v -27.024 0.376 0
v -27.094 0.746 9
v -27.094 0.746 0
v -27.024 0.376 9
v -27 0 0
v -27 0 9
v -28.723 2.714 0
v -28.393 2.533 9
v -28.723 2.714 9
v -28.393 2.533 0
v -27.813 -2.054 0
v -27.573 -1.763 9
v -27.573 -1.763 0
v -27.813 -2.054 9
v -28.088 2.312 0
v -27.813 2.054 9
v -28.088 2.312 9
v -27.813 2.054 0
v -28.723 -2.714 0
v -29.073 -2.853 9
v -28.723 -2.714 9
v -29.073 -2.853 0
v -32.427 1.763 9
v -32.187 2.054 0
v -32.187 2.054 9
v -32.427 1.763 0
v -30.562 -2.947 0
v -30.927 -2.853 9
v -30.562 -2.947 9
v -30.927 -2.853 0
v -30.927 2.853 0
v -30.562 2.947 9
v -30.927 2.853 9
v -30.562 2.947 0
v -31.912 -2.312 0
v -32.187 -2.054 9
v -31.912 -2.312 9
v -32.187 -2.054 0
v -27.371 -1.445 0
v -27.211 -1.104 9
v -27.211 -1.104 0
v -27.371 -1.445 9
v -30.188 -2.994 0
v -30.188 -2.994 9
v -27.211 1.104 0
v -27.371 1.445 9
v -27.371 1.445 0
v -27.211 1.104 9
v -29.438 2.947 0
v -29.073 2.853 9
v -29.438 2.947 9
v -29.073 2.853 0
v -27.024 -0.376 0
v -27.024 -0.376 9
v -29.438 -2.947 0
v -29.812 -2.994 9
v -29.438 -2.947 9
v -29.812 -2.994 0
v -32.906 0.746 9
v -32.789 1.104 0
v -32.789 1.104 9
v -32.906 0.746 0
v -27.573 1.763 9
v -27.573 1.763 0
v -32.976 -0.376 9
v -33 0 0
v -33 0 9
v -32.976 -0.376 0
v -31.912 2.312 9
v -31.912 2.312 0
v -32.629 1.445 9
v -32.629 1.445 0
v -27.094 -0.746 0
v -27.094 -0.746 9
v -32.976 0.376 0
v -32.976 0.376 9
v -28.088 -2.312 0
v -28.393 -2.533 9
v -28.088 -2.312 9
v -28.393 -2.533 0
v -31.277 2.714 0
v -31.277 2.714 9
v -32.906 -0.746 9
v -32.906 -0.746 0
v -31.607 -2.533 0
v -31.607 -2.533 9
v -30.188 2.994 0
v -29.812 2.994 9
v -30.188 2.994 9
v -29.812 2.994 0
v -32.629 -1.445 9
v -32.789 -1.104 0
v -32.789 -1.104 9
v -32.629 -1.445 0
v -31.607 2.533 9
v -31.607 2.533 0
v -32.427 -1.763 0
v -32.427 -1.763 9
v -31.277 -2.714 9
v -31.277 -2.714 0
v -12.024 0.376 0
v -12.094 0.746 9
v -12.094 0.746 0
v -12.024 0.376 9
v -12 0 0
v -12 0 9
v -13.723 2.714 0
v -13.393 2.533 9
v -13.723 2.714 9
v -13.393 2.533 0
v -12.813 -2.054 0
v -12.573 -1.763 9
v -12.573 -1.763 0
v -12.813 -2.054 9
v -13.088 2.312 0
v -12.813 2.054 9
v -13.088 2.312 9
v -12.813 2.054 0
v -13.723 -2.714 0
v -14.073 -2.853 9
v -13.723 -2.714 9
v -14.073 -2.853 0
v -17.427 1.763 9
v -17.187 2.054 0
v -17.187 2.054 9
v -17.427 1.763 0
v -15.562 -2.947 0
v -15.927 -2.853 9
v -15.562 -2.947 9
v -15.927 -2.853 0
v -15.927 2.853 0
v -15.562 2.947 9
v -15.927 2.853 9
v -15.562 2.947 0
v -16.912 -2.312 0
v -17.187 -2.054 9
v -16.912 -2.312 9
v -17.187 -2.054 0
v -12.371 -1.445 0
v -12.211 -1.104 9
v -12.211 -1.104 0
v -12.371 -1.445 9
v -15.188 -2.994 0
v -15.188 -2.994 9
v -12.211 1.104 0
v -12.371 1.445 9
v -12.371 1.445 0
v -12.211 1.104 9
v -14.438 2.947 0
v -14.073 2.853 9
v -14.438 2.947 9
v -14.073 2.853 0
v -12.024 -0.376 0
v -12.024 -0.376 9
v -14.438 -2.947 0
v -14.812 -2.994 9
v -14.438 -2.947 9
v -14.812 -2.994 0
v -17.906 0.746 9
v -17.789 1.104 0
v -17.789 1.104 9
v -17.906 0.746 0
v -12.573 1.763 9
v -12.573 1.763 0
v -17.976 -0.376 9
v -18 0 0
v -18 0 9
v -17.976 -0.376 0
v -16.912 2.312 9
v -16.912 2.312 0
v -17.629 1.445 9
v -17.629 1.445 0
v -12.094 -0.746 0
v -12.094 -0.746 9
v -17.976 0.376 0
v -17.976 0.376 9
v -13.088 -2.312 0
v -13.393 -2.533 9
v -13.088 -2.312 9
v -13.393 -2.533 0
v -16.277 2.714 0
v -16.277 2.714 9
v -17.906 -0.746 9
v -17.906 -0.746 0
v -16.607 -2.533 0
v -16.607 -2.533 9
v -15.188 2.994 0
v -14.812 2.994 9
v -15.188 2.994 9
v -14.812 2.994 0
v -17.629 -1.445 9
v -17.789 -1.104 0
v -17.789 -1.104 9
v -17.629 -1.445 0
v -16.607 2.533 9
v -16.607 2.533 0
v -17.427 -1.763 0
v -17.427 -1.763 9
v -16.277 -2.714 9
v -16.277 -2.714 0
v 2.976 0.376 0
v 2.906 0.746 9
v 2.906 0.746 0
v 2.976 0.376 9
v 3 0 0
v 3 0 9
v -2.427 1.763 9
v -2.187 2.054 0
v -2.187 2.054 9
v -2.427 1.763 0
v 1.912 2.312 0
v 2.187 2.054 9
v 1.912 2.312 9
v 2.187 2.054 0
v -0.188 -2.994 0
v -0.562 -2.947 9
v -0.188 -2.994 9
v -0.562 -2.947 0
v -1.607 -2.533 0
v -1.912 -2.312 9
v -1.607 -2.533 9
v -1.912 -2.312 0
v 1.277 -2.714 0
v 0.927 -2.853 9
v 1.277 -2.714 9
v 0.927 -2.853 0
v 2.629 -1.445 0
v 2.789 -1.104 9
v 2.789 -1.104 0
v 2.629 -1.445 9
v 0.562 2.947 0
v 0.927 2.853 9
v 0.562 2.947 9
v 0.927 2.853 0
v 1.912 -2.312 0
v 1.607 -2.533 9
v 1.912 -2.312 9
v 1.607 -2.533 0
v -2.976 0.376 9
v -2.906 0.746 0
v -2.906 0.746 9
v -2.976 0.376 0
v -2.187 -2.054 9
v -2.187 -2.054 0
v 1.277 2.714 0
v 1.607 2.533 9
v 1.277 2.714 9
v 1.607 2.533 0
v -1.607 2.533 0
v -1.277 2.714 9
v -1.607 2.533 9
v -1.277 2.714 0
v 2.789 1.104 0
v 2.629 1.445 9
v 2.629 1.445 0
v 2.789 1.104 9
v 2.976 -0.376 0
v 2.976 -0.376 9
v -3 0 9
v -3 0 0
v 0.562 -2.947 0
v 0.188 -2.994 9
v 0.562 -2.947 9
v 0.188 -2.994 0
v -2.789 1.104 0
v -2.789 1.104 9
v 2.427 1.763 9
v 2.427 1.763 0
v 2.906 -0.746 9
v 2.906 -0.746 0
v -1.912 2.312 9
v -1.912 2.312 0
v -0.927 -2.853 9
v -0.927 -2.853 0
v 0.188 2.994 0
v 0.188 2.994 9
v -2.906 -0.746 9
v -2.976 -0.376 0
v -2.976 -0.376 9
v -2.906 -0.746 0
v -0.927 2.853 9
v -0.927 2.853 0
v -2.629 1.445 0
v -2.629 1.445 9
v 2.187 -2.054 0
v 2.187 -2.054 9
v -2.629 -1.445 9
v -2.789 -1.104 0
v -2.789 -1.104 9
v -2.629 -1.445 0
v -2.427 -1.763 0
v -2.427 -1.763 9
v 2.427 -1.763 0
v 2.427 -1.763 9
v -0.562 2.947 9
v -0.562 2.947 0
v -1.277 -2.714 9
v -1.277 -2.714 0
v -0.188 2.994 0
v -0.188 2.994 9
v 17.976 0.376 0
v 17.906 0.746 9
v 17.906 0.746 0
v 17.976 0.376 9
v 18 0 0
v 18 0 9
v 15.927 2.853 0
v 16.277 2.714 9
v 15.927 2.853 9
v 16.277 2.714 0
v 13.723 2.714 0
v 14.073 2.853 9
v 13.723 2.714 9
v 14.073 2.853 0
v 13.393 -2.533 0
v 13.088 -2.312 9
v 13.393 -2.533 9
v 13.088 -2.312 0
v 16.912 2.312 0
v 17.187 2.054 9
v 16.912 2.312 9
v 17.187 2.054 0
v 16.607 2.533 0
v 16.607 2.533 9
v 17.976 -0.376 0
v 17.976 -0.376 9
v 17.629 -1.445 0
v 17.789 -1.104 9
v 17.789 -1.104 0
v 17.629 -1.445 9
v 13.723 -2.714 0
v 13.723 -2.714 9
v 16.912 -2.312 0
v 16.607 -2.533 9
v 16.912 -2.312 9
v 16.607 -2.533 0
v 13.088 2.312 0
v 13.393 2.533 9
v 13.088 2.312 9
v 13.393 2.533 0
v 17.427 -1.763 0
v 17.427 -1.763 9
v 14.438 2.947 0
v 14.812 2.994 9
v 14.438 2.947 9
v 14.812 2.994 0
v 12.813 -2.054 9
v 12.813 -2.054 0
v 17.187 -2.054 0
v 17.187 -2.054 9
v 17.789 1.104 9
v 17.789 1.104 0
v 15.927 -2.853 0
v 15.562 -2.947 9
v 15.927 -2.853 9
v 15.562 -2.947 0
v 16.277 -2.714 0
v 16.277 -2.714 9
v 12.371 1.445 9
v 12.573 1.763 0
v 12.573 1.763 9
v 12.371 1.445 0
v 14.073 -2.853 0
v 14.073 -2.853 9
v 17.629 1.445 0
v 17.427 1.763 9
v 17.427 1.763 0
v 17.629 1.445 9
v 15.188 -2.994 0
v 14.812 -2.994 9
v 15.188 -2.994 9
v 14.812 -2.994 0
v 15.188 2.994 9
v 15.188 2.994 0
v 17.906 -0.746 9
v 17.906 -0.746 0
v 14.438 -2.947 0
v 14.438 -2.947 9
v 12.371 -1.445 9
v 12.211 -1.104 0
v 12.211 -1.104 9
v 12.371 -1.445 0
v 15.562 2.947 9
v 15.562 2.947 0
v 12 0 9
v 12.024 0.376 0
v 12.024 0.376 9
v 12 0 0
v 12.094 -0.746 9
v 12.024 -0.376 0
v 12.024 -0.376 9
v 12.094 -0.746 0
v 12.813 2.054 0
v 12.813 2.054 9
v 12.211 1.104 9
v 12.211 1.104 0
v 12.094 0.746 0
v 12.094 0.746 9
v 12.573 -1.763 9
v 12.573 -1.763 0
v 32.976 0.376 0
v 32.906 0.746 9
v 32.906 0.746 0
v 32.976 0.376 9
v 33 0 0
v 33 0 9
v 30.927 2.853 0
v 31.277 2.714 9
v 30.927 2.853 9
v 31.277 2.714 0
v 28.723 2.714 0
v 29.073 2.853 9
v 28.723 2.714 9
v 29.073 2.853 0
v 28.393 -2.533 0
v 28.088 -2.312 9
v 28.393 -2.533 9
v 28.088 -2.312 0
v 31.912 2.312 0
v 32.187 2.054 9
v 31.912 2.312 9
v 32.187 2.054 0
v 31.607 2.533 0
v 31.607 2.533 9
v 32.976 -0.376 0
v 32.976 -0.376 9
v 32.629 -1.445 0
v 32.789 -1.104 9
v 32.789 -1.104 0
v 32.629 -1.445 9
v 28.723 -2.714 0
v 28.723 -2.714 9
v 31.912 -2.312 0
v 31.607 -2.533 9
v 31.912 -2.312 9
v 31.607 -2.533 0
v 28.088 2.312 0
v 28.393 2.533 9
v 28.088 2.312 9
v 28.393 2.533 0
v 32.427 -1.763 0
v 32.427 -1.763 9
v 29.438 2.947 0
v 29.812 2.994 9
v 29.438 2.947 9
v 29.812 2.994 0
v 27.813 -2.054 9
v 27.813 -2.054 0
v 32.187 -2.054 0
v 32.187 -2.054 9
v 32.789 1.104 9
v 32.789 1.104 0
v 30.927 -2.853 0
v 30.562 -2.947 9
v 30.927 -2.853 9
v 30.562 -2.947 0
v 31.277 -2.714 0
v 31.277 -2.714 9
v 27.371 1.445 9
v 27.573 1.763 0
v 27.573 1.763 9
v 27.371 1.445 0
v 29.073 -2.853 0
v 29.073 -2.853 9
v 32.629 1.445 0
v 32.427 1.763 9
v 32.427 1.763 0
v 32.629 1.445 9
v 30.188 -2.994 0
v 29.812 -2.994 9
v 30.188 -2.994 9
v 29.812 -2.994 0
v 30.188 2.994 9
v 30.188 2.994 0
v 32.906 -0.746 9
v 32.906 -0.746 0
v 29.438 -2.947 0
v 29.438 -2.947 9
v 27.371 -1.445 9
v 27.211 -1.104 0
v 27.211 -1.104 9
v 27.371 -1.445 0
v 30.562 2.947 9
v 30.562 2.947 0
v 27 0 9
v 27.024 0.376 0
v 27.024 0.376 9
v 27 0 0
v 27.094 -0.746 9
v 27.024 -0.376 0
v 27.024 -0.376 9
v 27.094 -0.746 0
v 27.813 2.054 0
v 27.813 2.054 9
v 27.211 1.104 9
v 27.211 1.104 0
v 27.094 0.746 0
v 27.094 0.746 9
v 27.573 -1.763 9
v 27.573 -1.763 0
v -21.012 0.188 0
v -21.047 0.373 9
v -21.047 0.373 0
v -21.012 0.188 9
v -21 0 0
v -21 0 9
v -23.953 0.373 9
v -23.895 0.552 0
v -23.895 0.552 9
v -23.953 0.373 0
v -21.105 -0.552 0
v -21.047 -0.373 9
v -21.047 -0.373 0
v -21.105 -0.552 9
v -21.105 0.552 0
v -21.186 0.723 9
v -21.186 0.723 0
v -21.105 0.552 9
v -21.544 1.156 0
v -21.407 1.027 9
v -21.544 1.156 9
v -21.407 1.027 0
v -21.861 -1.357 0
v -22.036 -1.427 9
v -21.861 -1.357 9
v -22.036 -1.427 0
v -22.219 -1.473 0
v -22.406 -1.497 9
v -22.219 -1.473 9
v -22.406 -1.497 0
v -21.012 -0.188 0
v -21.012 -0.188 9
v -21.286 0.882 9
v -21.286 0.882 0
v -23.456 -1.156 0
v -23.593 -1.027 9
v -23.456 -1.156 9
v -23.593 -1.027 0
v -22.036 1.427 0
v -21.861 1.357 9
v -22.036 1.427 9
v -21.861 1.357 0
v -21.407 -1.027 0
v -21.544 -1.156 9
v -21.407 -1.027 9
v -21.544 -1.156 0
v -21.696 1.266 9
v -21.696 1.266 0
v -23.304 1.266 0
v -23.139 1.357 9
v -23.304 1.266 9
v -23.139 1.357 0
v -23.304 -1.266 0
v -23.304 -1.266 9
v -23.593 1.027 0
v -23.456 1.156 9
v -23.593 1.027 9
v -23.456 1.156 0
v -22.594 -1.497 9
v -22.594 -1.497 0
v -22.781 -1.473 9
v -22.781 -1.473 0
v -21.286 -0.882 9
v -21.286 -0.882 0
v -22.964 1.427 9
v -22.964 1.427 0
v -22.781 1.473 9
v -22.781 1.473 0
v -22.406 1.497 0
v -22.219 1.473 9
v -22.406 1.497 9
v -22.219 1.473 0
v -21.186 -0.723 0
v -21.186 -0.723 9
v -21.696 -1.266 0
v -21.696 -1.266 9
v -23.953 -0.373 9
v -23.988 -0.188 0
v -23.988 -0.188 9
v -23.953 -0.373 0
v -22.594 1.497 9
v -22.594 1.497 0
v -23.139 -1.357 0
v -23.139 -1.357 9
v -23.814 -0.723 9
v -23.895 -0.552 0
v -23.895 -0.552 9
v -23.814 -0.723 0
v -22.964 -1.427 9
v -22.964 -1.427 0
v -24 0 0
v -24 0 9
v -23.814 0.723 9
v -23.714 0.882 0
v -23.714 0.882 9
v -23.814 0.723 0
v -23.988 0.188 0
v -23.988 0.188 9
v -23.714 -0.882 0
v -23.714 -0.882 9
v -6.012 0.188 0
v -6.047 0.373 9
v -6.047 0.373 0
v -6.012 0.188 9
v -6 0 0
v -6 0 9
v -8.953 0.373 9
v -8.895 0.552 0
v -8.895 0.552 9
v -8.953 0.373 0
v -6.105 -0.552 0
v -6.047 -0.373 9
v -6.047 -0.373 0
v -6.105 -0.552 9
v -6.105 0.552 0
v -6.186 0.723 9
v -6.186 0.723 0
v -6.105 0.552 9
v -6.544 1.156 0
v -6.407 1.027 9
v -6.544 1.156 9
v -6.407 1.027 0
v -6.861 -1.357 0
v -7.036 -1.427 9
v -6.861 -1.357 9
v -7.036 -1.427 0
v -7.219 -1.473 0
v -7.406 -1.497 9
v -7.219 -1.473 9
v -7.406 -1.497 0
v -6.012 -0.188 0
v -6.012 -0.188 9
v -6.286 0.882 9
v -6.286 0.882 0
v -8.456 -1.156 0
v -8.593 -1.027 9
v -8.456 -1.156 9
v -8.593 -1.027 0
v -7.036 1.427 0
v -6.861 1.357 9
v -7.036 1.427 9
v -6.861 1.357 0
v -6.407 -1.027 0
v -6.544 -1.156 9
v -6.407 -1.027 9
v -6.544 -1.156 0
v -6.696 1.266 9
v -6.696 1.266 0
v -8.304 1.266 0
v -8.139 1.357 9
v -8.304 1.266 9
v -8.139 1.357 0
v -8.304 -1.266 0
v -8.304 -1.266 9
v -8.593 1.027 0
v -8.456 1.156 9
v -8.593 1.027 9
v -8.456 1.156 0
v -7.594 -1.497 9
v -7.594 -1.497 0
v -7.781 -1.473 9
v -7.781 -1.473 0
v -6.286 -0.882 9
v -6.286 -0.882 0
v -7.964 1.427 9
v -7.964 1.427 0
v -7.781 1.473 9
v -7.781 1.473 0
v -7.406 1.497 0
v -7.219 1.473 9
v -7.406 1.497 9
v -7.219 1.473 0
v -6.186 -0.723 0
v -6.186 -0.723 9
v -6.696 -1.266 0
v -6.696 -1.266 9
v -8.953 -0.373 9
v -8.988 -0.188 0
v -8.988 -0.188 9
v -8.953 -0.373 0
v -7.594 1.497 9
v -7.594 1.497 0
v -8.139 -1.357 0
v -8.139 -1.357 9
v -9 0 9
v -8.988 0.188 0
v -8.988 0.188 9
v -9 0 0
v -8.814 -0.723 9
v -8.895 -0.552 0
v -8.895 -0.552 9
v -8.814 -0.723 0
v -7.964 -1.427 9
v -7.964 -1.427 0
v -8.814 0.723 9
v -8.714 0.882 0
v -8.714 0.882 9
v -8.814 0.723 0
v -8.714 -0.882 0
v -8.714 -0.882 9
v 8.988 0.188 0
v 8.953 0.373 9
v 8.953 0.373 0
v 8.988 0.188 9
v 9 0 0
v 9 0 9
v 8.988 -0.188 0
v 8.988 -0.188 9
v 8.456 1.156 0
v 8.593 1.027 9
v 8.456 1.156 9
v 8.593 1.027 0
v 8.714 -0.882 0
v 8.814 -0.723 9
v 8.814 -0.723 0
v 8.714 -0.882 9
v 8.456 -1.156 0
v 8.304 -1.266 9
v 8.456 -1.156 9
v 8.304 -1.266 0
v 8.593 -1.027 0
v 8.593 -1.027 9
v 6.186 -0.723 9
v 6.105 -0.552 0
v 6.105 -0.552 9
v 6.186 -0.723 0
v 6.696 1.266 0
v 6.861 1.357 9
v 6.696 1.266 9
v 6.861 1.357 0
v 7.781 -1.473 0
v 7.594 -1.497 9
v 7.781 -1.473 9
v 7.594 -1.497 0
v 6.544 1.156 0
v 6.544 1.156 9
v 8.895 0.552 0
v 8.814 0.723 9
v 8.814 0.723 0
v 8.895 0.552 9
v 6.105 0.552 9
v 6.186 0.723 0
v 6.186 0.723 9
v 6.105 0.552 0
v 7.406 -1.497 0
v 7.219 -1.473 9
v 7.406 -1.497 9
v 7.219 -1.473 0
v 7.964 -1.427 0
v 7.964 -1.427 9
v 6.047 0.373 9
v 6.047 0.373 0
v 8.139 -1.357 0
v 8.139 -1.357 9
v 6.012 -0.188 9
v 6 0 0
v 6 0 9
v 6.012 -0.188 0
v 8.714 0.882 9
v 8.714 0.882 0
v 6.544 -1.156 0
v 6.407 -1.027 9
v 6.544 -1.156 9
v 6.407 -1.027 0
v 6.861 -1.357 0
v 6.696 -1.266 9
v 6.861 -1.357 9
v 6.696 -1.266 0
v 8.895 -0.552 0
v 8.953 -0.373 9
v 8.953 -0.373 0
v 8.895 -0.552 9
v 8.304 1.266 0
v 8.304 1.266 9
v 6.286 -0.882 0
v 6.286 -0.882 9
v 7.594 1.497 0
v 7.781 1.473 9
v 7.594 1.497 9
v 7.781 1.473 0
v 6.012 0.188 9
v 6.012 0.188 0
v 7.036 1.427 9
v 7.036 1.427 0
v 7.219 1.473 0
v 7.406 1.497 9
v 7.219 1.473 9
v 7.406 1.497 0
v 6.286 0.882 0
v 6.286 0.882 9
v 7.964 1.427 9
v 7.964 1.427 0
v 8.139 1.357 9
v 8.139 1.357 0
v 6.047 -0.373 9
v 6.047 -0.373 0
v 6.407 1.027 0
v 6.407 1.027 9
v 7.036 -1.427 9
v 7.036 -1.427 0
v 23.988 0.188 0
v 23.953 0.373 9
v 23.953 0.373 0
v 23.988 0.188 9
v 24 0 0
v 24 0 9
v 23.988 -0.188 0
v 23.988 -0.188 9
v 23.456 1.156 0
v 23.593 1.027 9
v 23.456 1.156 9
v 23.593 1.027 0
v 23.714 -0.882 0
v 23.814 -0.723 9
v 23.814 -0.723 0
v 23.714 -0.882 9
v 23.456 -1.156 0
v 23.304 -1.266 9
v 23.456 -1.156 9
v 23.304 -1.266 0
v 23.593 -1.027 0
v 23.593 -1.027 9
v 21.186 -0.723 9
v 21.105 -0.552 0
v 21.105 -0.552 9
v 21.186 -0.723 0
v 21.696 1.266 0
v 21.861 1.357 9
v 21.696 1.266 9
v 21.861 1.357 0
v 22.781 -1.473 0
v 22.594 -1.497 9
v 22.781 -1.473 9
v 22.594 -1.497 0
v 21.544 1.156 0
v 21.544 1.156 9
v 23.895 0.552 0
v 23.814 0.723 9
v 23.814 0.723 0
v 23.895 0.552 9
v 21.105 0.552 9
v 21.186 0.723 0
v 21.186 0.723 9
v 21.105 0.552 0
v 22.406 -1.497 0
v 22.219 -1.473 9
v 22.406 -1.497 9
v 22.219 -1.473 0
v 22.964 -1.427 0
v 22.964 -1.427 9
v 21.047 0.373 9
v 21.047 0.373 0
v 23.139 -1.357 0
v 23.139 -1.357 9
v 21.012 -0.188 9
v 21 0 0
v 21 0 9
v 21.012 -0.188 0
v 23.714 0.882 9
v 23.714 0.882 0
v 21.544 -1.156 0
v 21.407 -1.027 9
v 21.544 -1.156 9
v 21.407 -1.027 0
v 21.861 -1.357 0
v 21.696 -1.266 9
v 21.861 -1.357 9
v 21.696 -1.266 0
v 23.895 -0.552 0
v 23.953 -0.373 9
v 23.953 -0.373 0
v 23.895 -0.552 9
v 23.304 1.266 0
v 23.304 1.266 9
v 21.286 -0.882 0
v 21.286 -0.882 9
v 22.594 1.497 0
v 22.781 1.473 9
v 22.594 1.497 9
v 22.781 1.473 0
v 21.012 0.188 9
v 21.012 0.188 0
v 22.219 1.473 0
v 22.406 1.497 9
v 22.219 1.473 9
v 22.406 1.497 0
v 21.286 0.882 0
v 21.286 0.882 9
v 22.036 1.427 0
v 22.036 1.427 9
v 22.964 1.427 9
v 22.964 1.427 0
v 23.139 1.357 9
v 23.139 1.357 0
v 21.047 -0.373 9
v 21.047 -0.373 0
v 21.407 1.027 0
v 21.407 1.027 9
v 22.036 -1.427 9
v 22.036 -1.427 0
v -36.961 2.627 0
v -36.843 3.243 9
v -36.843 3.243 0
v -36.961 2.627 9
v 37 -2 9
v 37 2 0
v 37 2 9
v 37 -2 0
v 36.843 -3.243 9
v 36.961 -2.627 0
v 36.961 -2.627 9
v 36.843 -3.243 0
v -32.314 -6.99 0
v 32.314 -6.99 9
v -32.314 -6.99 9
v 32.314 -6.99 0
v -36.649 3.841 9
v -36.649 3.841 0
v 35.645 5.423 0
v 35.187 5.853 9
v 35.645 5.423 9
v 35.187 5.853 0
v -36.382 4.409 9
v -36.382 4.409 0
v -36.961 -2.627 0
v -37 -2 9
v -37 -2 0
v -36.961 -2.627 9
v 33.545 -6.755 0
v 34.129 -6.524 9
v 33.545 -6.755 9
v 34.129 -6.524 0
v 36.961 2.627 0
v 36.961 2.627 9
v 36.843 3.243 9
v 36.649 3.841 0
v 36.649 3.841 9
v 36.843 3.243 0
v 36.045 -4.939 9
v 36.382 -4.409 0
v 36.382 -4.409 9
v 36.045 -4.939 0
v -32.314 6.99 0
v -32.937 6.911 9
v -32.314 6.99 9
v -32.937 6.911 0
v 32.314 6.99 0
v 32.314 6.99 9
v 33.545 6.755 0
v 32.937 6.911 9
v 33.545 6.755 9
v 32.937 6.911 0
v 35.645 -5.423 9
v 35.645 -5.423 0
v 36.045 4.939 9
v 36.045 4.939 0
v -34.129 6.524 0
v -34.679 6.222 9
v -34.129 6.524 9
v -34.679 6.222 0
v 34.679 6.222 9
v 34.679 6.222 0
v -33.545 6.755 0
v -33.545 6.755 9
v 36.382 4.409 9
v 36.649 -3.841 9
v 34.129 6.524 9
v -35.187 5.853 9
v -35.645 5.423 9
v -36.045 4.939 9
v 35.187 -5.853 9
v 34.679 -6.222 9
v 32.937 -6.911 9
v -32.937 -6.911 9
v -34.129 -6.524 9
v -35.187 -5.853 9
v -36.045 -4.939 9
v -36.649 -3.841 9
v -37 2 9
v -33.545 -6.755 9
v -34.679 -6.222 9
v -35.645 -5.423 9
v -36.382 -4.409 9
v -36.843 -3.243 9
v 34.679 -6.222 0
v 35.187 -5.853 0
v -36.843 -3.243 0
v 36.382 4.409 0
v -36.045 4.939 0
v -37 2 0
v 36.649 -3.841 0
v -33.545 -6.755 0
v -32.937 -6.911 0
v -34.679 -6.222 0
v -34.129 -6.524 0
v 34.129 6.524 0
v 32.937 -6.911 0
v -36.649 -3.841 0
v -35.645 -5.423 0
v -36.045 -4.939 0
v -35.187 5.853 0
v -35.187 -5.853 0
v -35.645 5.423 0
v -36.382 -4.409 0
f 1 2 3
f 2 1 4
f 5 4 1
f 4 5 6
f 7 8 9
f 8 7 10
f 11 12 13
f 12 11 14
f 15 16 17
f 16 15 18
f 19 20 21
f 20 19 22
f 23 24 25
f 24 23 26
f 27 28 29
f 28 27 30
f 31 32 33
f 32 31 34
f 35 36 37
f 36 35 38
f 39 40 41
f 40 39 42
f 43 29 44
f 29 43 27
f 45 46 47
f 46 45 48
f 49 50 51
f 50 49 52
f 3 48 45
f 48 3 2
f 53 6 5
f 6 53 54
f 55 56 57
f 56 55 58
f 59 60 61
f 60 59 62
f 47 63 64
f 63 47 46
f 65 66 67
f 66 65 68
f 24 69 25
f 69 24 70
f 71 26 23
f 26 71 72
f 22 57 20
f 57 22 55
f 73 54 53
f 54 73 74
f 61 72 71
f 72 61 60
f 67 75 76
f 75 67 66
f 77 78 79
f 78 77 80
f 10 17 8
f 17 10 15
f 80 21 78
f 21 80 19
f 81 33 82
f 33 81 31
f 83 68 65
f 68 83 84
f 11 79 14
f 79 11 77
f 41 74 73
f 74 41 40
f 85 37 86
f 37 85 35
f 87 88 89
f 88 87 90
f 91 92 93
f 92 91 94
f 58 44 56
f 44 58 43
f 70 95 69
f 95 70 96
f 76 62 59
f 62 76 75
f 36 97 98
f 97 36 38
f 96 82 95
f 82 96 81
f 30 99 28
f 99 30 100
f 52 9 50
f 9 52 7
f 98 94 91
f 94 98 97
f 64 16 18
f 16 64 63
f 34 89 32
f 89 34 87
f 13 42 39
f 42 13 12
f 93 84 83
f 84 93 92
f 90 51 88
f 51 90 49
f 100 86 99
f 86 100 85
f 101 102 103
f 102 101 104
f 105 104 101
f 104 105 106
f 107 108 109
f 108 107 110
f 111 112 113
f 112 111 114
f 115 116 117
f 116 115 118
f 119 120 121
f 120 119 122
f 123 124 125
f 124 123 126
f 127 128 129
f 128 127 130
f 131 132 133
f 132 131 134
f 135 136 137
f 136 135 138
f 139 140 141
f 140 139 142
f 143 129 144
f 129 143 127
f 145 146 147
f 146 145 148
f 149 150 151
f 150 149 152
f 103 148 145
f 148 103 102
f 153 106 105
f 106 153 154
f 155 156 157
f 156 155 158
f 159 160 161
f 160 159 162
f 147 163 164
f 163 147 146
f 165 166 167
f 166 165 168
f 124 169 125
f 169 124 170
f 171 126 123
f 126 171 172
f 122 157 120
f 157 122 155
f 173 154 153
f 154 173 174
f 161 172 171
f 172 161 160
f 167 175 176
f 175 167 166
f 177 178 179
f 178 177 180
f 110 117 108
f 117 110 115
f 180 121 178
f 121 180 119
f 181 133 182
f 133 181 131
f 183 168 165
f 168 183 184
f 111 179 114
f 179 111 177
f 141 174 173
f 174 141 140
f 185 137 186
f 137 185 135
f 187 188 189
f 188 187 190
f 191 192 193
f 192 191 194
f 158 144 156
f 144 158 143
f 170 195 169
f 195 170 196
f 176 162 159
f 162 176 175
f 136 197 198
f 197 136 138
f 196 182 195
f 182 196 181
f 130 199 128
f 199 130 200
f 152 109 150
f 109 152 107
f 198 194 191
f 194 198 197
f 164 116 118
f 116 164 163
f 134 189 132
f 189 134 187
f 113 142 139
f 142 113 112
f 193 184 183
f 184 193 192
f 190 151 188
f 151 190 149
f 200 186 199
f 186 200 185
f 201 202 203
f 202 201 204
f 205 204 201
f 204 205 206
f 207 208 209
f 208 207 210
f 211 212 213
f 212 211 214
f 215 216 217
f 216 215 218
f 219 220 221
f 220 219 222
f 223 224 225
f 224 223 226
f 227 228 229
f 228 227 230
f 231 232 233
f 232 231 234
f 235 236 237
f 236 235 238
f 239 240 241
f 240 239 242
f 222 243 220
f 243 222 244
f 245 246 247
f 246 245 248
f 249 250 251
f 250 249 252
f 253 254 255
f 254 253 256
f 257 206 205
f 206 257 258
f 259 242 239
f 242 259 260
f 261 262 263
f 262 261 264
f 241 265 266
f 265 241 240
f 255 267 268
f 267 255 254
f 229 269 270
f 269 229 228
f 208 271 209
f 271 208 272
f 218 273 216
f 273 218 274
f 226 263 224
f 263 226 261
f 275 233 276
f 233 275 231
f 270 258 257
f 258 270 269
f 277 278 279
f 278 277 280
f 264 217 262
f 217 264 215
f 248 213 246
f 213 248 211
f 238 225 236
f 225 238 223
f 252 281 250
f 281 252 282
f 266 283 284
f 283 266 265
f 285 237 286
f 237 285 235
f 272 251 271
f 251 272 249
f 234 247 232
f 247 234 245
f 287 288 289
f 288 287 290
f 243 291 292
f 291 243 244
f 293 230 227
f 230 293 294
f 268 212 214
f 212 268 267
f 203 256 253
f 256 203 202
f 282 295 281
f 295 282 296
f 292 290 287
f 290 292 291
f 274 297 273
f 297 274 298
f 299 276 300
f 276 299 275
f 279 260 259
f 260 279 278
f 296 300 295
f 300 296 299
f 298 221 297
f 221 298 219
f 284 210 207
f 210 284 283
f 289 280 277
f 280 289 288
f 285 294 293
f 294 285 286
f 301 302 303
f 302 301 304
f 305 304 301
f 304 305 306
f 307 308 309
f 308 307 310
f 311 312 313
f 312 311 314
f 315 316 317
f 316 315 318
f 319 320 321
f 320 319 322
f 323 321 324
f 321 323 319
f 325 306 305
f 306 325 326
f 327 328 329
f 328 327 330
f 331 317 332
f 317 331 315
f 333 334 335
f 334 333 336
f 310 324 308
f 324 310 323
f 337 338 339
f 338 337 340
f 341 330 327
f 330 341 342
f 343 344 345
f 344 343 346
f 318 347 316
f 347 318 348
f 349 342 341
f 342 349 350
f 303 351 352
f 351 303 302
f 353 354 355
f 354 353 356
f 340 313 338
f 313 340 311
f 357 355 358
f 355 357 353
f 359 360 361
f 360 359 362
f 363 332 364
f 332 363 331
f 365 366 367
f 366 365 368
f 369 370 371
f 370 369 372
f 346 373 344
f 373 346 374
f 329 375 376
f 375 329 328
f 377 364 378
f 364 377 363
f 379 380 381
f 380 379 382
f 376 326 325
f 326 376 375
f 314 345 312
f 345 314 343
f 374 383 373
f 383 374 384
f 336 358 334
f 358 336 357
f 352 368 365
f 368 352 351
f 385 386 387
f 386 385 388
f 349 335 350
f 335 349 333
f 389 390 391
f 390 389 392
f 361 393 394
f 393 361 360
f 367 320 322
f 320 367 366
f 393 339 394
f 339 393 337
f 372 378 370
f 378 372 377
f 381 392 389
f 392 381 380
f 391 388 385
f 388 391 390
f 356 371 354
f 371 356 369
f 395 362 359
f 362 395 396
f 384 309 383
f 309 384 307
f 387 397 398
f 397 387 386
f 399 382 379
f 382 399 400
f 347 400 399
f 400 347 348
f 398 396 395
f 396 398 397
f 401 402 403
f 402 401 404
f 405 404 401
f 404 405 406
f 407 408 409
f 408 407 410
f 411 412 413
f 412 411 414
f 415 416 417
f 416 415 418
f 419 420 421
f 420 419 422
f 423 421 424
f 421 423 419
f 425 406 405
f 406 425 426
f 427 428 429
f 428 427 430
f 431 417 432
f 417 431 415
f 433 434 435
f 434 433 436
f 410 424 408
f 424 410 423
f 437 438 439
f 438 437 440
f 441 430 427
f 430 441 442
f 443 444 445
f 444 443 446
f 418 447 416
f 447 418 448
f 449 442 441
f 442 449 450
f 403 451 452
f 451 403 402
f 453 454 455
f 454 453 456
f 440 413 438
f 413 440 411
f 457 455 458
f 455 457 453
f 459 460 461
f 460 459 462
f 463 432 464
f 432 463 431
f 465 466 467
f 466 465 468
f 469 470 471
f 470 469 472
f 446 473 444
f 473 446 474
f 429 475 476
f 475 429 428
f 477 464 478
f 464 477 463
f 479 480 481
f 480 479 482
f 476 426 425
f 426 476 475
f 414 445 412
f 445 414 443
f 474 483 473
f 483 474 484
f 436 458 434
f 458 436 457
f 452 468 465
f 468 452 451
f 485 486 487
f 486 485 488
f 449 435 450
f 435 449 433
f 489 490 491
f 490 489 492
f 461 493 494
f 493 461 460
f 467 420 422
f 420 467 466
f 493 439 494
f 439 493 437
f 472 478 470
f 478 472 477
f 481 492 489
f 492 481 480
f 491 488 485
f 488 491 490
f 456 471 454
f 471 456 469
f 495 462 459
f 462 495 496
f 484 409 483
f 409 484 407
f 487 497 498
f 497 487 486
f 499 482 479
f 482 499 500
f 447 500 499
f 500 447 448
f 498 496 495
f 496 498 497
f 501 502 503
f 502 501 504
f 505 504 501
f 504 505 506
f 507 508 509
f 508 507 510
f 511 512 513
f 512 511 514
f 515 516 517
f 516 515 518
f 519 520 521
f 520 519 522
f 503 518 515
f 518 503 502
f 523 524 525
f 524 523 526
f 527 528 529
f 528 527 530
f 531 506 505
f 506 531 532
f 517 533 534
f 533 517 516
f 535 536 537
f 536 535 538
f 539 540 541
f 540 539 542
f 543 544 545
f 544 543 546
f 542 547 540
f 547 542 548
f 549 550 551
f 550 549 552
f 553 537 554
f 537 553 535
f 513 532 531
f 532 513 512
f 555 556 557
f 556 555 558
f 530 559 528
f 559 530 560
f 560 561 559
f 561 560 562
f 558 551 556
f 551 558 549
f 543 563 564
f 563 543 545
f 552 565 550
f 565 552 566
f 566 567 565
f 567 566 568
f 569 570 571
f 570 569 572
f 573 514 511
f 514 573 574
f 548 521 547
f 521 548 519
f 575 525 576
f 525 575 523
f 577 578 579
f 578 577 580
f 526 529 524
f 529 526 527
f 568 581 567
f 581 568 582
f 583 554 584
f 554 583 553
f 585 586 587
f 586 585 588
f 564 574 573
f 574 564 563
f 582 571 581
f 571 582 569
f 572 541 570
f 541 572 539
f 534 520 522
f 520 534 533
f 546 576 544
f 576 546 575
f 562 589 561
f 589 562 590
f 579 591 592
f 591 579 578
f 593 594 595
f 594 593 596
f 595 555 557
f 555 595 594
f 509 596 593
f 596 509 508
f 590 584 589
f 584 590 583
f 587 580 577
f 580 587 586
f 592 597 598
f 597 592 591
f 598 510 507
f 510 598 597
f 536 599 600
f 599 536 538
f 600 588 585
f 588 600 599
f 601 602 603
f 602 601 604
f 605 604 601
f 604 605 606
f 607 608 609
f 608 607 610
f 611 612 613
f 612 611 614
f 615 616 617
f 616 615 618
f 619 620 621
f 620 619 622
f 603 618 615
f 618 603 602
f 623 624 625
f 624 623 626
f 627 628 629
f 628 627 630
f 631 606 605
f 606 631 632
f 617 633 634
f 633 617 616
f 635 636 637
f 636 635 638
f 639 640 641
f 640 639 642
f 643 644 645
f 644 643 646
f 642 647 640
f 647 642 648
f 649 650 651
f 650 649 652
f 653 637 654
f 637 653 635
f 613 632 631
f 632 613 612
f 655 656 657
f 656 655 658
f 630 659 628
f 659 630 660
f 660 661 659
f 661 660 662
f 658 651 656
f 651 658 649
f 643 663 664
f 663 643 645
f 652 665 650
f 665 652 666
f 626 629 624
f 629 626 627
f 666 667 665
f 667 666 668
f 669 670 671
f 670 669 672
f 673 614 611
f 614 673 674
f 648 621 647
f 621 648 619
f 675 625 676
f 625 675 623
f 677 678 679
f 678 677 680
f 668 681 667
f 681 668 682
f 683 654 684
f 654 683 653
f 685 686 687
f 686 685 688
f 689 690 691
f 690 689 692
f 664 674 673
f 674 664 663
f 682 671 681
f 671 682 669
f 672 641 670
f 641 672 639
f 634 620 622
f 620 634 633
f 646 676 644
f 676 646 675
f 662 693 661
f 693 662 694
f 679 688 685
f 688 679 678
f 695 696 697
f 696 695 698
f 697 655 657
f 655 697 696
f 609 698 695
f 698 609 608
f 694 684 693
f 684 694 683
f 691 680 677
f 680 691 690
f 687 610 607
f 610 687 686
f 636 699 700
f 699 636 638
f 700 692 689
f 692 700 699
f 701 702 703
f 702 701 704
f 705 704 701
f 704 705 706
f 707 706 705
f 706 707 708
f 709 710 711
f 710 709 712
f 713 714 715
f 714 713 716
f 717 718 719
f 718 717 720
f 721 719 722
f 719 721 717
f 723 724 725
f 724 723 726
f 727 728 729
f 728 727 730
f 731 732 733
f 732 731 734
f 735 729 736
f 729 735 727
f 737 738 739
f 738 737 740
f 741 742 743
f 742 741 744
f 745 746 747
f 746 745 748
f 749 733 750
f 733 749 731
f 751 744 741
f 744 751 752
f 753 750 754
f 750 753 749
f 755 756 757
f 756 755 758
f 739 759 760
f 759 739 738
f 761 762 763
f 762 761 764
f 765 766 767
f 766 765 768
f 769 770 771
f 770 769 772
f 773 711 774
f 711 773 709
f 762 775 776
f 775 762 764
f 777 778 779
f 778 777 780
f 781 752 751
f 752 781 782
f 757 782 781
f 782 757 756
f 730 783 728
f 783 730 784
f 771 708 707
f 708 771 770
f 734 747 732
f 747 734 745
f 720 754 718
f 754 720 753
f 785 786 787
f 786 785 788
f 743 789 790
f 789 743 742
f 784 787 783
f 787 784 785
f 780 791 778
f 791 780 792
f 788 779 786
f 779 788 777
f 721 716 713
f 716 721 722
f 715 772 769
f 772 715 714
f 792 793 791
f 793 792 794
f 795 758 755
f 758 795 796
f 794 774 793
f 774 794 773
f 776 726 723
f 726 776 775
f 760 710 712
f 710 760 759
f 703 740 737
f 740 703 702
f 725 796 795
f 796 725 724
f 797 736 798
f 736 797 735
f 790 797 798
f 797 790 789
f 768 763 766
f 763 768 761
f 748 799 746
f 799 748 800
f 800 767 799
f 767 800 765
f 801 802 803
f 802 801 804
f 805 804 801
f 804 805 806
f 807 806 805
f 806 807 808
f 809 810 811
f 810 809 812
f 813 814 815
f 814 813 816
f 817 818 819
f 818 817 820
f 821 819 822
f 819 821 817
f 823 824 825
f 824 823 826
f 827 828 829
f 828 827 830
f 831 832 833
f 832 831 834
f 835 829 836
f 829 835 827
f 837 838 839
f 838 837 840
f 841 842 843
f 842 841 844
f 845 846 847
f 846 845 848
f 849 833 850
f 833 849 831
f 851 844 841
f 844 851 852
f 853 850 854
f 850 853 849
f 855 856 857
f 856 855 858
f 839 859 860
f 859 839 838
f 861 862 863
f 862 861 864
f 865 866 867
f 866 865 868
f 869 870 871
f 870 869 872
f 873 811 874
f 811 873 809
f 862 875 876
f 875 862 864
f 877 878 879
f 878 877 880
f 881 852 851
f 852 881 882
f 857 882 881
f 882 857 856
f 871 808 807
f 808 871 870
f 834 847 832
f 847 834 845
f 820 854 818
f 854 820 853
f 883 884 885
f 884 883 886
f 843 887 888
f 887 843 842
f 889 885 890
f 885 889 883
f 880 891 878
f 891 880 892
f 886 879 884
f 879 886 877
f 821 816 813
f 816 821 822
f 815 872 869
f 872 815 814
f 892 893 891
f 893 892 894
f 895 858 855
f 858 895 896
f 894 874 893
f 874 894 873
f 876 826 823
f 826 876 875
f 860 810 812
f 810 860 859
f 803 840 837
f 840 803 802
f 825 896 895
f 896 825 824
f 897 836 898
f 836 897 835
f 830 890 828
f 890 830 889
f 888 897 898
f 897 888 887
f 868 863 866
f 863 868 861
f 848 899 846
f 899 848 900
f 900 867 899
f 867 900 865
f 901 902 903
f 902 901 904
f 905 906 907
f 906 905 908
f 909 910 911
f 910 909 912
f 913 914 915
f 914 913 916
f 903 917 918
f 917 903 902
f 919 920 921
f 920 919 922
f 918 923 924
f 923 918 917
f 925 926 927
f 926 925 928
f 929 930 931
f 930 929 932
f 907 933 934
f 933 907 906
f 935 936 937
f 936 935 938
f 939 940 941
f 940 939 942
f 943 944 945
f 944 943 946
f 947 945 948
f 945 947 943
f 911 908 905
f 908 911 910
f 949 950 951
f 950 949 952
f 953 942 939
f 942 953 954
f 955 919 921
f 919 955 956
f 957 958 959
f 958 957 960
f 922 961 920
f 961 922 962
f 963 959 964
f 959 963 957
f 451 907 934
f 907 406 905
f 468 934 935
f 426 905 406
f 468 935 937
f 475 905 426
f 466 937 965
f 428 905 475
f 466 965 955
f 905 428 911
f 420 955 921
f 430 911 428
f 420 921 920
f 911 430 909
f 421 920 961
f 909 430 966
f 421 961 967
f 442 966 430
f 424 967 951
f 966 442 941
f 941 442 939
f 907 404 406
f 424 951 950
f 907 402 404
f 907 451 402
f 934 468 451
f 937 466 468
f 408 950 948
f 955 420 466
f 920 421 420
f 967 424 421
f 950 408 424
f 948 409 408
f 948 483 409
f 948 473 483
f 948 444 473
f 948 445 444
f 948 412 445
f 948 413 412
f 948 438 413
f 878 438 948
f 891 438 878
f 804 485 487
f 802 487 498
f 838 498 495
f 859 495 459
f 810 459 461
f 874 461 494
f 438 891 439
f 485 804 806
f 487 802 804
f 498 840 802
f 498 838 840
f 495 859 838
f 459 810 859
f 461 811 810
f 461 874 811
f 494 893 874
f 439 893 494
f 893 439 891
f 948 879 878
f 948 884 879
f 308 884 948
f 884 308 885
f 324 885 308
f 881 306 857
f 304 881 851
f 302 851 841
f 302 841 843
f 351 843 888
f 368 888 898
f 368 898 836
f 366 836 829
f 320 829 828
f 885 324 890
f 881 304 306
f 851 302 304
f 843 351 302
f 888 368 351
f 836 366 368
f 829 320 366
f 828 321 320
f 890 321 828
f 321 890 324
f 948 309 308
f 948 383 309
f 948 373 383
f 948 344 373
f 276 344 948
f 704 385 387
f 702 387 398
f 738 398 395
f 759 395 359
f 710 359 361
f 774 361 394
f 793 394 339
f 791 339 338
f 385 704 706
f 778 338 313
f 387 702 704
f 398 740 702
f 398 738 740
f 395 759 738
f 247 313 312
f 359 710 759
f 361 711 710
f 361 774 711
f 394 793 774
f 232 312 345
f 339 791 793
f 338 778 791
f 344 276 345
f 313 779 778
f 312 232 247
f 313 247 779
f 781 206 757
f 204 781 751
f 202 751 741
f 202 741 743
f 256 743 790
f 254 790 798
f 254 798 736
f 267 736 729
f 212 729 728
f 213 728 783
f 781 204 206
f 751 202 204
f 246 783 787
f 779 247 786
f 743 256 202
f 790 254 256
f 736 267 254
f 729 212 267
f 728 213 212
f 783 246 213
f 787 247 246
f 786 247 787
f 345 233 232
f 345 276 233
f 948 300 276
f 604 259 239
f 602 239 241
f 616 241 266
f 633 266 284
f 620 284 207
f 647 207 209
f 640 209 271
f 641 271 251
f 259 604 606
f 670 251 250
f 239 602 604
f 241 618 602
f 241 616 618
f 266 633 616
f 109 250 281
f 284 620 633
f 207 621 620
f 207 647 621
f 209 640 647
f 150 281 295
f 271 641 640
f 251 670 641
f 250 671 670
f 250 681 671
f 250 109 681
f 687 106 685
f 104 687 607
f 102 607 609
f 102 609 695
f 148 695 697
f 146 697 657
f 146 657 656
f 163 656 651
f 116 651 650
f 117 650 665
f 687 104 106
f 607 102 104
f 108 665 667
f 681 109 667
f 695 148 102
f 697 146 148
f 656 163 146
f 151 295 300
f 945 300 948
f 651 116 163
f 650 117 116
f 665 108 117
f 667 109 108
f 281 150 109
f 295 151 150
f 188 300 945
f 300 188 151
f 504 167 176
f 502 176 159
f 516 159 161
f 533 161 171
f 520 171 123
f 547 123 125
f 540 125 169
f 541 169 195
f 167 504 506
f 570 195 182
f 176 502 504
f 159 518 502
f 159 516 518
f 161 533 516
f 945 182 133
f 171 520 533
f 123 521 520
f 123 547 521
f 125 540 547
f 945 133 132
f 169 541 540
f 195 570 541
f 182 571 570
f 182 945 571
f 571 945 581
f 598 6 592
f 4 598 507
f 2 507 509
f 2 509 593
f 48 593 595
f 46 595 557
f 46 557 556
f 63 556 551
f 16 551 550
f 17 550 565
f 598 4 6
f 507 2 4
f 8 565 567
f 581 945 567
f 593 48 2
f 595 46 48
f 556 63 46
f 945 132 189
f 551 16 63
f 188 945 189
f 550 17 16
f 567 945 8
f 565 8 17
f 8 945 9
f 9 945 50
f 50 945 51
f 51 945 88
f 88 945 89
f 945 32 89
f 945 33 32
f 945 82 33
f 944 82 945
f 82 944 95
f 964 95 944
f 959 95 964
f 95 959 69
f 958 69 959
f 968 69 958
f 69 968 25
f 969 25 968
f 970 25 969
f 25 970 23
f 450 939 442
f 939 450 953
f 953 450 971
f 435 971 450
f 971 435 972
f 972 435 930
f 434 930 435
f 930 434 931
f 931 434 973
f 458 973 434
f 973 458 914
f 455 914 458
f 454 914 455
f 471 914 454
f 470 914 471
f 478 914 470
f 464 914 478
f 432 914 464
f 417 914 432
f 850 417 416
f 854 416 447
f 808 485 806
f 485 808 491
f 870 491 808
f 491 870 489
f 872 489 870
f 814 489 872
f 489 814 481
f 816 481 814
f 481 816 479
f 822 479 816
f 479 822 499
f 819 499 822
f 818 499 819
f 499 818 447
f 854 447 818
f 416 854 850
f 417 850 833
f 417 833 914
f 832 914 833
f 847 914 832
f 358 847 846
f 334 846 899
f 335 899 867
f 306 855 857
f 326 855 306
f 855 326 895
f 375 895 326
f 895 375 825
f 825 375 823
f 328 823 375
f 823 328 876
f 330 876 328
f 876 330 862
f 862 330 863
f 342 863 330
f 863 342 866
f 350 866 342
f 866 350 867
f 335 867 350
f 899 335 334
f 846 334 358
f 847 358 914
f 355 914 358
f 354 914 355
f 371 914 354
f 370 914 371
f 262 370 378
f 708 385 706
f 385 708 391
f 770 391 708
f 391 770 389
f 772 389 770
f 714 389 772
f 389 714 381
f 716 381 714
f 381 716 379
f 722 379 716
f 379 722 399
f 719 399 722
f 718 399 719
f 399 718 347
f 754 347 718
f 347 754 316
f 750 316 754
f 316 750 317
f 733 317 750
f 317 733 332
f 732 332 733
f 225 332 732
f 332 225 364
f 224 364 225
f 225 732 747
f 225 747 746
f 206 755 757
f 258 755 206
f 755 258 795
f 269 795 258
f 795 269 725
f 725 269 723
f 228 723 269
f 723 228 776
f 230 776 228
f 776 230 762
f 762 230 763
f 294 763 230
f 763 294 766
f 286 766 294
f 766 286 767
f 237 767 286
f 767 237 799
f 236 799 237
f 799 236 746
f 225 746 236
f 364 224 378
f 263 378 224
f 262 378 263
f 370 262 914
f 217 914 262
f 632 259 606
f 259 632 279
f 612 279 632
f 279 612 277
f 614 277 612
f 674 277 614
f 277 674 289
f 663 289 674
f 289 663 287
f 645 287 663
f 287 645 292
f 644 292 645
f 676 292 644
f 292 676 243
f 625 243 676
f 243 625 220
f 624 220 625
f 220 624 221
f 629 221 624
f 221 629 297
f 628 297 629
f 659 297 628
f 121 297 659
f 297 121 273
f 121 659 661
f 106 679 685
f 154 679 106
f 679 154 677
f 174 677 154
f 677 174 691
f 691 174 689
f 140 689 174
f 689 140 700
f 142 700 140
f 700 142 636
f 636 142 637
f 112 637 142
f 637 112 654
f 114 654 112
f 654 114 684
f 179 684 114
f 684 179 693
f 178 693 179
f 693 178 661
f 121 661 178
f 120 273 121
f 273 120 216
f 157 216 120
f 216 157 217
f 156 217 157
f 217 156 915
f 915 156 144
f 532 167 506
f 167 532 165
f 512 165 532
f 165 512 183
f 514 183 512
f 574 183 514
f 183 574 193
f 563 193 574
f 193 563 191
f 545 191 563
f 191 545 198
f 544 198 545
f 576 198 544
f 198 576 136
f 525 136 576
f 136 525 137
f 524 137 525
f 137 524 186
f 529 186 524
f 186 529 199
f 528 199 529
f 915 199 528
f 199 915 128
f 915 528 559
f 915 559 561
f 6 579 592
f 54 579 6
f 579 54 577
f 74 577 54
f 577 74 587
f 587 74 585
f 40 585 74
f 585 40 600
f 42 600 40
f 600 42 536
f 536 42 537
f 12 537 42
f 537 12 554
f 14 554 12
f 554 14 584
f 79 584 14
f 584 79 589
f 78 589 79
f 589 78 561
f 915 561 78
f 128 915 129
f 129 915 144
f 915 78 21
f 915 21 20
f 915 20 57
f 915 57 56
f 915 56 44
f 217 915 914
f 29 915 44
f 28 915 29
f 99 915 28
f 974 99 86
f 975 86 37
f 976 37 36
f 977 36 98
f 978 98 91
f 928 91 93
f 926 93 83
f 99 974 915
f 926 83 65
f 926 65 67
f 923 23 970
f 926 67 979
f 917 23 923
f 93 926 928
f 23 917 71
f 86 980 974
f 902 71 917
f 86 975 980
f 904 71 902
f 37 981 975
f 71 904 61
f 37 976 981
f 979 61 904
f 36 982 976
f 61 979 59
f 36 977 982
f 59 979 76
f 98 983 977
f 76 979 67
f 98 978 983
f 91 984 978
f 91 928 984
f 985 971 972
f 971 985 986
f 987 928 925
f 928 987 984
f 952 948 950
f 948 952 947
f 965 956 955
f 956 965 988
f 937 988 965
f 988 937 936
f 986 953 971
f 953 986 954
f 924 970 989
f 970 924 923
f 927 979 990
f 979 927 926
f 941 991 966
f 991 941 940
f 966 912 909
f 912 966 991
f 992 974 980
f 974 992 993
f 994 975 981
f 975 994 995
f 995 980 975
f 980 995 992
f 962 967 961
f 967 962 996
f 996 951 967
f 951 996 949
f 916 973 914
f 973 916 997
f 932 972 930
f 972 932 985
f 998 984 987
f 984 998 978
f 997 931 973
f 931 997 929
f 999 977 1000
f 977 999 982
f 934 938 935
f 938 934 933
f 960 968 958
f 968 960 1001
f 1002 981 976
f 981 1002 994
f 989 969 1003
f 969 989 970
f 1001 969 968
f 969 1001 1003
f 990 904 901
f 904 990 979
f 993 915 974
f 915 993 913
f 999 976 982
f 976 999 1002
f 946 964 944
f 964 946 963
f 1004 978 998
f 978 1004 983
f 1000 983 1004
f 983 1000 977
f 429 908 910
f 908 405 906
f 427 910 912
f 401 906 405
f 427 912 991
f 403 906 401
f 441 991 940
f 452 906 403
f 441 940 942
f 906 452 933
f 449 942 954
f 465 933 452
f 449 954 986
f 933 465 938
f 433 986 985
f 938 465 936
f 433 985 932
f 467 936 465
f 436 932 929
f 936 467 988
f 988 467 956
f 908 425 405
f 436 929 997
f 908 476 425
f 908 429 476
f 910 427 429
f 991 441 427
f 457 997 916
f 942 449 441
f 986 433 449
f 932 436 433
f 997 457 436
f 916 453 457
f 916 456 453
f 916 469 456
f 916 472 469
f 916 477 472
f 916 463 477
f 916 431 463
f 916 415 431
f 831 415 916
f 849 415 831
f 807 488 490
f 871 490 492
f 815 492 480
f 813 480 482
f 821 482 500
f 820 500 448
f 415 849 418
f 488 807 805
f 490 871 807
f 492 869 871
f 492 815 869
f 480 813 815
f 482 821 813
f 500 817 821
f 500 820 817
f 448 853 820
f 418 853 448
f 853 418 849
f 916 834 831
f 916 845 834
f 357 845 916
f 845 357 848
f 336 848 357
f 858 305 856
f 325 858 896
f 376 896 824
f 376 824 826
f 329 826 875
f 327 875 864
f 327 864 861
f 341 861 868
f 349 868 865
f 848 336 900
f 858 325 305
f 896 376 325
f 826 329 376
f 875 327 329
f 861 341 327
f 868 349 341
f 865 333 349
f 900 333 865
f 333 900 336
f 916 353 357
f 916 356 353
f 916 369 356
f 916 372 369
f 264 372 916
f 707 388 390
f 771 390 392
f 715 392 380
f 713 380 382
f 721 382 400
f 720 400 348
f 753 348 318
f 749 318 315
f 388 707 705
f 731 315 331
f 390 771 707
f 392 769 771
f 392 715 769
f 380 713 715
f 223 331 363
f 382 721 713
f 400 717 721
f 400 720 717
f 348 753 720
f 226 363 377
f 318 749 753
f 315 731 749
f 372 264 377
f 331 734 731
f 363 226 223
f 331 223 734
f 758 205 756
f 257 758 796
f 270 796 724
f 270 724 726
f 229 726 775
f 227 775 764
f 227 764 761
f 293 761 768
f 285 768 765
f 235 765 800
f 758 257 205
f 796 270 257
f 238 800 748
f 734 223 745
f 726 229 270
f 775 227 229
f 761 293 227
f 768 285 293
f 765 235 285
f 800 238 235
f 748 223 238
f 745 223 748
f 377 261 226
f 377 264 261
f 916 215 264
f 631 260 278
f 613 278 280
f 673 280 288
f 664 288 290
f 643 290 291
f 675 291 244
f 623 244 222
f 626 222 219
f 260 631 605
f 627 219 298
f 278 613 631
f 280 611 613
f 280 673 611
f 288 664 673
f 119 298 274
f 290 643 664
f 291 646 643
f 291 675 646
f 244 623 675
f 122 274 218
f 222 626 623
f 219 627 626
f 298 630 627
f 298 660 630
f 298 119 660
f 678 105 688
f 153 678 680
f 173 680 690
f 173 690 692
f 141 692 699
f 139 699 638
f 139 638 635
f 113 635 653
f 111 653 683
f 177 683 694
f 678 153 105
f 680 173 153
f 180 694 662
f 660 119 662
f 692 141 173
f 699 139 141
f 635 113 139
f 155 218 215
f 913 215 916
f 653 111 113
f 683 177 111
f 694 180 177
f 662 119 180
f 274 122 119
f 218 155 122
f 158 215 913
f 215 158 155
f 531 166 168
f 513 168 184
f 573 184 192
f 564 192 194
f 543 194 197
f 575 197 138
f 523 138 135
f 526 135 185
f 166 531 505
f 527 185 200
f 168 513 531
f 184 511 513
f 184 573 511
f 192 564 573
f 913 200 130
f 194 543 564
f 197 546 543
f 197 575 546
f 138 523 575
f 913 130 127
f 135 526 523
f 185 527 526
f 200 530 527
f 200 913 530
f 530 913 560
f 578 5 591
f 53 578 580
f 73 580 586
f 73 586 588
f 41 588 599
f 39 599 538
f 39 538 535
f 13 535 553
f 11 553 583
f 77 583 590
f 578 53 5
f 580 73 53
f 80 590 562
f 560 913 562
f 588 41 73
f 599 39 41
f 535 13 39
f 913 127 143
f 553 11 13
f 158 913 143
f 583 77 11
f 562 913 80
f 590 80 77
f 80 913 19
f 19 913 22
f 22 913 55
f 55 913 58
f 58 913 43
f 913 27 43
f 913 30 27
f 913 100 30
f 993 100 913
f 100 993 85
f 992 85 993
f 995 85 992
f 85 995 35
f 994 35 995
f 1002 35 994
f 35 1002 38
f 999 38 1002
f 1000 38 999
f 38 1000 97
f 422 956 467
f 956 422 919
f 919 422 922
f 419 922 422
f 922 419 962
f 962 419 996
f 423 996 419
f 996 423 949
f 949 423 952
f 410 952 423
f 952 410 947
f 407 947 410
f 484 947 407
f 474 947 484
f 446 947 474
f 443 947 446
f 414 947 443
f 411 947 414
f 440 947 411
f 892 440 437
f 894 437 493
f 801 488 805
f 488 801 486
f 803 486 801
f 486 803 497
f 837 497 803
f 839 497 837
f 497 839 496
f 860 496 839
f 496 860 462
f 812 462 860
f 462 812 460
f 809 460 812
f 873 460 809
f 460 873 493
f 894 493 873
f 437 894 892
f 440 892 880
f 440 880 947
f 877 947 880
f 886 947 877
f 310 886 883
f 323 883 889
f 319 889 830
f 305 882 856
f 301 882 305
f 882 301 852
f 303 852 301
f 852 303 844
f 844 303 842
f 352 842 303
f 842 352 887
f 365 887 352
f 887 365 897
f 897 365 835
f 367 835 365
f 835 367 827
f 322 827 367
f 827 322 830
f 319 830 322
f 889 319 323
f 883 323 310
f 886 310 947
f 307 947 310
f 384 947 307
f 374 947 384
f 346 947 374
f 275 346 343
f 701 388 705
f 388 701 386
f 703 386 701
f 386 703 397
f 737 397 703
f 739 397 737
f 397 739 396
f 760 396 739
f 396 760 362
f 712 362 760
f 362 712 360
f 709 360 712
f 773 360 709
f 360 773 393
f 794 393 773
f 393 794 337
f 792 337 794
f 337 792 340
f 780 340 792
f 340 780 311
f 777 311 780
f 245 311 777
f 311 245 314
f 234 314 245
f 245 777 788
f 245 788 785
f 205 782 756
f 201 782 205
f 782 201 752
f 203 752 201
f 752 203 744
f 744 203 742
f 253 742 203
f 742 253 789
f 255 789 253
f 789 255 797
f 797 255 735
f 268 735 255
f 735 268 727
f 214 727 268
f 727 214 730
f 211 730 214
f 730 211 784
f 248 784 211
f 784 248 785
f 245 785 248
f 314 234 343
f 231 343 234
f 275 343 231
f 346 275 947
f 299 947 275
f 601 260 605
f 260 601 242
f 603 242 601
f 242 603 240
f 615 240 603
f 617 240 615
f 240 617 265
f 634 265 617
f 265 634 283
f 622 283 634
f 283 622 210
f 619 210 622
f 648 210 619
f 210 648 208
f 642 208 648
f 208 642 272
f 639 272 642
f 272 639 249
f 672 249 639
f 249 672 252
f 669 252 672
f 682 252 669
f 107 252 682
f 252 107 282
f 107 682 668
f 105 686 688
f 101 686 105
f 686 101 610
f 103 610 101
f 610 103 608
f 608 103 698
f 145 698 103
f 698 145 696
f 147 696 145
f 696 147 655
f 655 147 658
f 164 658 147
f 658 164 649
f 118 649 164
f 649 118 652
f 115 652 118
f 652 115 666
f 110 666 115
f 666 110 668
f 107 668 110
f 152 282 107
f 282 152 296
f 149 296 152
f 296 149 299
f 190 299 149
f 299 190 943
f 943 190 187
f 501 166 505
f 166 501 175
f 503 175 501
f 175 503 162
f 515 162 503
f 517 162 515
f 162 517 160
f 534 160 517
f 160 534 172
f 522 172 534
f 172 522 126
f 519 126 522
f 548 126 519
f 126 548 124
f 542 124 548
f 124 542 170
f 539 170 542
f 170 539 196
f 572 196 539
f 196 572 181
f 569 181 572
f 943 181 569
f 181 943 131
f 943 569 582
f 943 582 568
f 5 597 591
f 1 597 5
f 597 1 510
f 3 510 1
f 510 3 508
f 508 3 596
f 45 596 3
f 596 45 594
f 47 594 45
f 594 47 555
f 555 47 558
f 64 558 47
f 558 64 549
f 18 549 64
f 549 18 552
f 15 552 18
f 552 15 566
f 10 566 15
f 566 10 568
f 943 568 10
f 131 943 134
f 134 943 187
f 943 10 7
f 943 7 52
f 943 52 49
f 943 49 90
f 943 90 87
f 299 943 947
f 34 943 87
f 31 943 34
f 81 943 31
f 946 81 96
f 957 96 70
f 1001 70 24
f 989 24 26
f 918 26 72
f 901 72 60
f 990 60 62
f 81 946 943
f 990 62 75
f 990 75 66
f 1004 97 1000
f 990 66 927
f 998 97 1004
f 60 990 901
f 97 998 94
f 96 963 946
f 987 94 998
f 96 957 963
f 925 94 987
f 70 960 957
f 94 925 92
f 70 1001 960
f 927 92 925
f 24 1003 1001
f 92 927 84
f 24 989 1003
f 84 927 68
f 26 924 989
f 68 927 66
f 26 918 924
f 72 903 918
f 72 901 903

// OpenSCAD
$fn = 50;


difference() {
	union() {
		translate(v = [0, 0, 0]) {
			rotate(a = [0, 0, 0]) {
				hull() {
					translate(v = [-32.0000000000, 2.0000000000, 0]) {
						rotate(a = [0, 0, 0]) {
							translate(v = [0, 0, 0]) {
								rotate(a = [0, 0, 0]) {
									cylinder(h = 9, r = 5);
								}
							}
						}
					}
					translate(v = [32.0000000000, 2.0000000000, 0]) {
						rotate(a = [0, 0, 0]) {
							translate(v = [0, 0, 0]) {
								rotate(a = [0, 0, 0]) {
									cylinder(h = 9, r = 5);
								}
							}
						}
					}
					translate(v = [-32.0000000000, -2.0000000000, 0]) {
						rotate(a = [0, 0, 0]) {
							translate(v = [0, 0, 0]) {
								rotate(a = [0, 0, 0]) {
									cylinder(h = 9, r = 5);
								}
							}
						}
					}
					translate(v = [32.0000000000, -2.0000000000, 0]) {
						rotate(a = [0, 0, 0]) {
							translate(v = [0, 0, 0]) {
								rotate(a = [0, 0, 0]) {
									cylinder(h = 9, r = 5);
								}
							}
						}
					}
				}
			}
		}
	}
	union() {
		translate(v = [-30.0000000000, 0.0000000000, 0]) {
			rotate(a = [0, 0, 0]) {
				translate(v = [0, 0, -50]) {
					rotate(a = [0, 0, 0]) {
						cylinder(h = 100, r = 3.0000000000);
					}
				}
			}
		}
		translate(v = [-15.0000000000, 0.0000000000, 0]) {
			rotate(a = [0, 0, 0]) {
				translate(v = [0, 0, -50]) {
					rotate(a = [0, 0, 0]) {
						cylinder(h = 100, r = 3.0000000000);
					}
				}
			}
		}
		translate(v = [0.0000000000, 0.0000000000, 0]) {
			rotate(a = [0, 0, 0]) {
				translate(v = [0, 0, -50]) {
					rotate(a = [0, 0, 0]) {
						cylinder(h = 100, r = 3.0000000000);
					}
				}
			}
		}
		translate(v = [15.0000000000, 0.0000000000, 0]) {
			rotate(a = [0, 0, 0]) {
				translate(v = [0, 0, -50]) {
					rotate(a = [0, 0, 0]) {
						cylinder(h = 100, r = 3.0000000000);
					}
				}
			}
		}
		translate(v = [30.0000000000, 0.0000000000, 0]) {
			rotate(a = [0, 0, 0]) {
				translate(v = [0, 0, -50]) {
					rotate(a = [0, 0, 0]) {
						cylinder(h = 100, r = 3.0000000000);
					}
				}
			}
		}
		translate(v = [-30.0000000000, 0.0000000000, 0]) {
			rotate(a = [0, 0, 0]) {
				translate(v = [0, 0, -50]) {
					rotate(a = [0, 0, 0]) {
						cylinder(h = 100, r = 1.5000000000);
					}
				}
			}
		}
		translate(v = [-22.5000000000, 0.0000000000, 0]) {
			rotate(a = [0, 0, 0]) {
				translate(v = [0, 0, -50]) {
					rotate(a = [0, 0, 0]) {
						cylinder(h = 100, r = 1.5000000000);
					}
				}
			}
		}
		translate(v = [-15.0000000000, 0.0000000000, 0]) {
			rotate(a = [0, 0, 0]) {
				translate(v = [0, 0, -50]) {
					rotate(a = [0, 0, 0]) {
						cylinder(h = 100, r = 1.5000000000);
					}
				}
			}
		}
		translate(v = [-7.5000000000, 0.0000000000, 0]) {
			rotate(a = [0, 0, 0]) {
				translate(v = [0, 0, -50]) {
					rotate(a = [0, 0, 0]) {
						cylinder(h = 100, r = 1.5000000000);
					}
				}
			}
		}
		translate(v = [0.0000000000, 0.0000000000, 0]) {
			rotate(a = [0, 0, 0]) {
				translate(v = [0, 0, -50]) {
					rotate(a = [0, 0, 0]) {
						cylinder(h = 100, r = 1.5000000000);
					}
				}
			}
		}
		translate(v = [7.5000000000, 0.0000000000, 0]) {
			rotate(a = [0, 0, 0]) {
				translate(v = [0, 0, -50]) {
					rotate(a = [0, 0, 0]) {
						cylinder(h = 100, r = 1.5000000000);
					}
				}
			}
		}
		translate(v = [15.0000000000, 0.0000000000, 0]) {
			rotate(a = [0, 0, 0]) {
				translate(v = [0, 0, -50]) {
					rotate(a = [0, 0, 0]) {
						cylinder(h = 100, r = 1.5000000000);
					}
				}
			}
		}
		translate(v = [22.5000000000, 0.0000000000, 0]) {
			rotate(a = [0, 0, 0]) {
				translate(v = [0, 0, -50]) {
					rotate(a = [0, 0, 0]) {
						cylinder(h = 100, r = 1.5000000000);
					}
				}
			}
		}
		translate(v = [30.0000000000, 0.0000000000, 0]) {
			rotate(a = [0, 0, 0]) {
				translate(v = [0, 0, -50]) {
					rotate(a = [0, 0, 0]) {
						cylinder(h = 100, r = 1.5000000000);
					}
				}
			}
		}
	}
}
